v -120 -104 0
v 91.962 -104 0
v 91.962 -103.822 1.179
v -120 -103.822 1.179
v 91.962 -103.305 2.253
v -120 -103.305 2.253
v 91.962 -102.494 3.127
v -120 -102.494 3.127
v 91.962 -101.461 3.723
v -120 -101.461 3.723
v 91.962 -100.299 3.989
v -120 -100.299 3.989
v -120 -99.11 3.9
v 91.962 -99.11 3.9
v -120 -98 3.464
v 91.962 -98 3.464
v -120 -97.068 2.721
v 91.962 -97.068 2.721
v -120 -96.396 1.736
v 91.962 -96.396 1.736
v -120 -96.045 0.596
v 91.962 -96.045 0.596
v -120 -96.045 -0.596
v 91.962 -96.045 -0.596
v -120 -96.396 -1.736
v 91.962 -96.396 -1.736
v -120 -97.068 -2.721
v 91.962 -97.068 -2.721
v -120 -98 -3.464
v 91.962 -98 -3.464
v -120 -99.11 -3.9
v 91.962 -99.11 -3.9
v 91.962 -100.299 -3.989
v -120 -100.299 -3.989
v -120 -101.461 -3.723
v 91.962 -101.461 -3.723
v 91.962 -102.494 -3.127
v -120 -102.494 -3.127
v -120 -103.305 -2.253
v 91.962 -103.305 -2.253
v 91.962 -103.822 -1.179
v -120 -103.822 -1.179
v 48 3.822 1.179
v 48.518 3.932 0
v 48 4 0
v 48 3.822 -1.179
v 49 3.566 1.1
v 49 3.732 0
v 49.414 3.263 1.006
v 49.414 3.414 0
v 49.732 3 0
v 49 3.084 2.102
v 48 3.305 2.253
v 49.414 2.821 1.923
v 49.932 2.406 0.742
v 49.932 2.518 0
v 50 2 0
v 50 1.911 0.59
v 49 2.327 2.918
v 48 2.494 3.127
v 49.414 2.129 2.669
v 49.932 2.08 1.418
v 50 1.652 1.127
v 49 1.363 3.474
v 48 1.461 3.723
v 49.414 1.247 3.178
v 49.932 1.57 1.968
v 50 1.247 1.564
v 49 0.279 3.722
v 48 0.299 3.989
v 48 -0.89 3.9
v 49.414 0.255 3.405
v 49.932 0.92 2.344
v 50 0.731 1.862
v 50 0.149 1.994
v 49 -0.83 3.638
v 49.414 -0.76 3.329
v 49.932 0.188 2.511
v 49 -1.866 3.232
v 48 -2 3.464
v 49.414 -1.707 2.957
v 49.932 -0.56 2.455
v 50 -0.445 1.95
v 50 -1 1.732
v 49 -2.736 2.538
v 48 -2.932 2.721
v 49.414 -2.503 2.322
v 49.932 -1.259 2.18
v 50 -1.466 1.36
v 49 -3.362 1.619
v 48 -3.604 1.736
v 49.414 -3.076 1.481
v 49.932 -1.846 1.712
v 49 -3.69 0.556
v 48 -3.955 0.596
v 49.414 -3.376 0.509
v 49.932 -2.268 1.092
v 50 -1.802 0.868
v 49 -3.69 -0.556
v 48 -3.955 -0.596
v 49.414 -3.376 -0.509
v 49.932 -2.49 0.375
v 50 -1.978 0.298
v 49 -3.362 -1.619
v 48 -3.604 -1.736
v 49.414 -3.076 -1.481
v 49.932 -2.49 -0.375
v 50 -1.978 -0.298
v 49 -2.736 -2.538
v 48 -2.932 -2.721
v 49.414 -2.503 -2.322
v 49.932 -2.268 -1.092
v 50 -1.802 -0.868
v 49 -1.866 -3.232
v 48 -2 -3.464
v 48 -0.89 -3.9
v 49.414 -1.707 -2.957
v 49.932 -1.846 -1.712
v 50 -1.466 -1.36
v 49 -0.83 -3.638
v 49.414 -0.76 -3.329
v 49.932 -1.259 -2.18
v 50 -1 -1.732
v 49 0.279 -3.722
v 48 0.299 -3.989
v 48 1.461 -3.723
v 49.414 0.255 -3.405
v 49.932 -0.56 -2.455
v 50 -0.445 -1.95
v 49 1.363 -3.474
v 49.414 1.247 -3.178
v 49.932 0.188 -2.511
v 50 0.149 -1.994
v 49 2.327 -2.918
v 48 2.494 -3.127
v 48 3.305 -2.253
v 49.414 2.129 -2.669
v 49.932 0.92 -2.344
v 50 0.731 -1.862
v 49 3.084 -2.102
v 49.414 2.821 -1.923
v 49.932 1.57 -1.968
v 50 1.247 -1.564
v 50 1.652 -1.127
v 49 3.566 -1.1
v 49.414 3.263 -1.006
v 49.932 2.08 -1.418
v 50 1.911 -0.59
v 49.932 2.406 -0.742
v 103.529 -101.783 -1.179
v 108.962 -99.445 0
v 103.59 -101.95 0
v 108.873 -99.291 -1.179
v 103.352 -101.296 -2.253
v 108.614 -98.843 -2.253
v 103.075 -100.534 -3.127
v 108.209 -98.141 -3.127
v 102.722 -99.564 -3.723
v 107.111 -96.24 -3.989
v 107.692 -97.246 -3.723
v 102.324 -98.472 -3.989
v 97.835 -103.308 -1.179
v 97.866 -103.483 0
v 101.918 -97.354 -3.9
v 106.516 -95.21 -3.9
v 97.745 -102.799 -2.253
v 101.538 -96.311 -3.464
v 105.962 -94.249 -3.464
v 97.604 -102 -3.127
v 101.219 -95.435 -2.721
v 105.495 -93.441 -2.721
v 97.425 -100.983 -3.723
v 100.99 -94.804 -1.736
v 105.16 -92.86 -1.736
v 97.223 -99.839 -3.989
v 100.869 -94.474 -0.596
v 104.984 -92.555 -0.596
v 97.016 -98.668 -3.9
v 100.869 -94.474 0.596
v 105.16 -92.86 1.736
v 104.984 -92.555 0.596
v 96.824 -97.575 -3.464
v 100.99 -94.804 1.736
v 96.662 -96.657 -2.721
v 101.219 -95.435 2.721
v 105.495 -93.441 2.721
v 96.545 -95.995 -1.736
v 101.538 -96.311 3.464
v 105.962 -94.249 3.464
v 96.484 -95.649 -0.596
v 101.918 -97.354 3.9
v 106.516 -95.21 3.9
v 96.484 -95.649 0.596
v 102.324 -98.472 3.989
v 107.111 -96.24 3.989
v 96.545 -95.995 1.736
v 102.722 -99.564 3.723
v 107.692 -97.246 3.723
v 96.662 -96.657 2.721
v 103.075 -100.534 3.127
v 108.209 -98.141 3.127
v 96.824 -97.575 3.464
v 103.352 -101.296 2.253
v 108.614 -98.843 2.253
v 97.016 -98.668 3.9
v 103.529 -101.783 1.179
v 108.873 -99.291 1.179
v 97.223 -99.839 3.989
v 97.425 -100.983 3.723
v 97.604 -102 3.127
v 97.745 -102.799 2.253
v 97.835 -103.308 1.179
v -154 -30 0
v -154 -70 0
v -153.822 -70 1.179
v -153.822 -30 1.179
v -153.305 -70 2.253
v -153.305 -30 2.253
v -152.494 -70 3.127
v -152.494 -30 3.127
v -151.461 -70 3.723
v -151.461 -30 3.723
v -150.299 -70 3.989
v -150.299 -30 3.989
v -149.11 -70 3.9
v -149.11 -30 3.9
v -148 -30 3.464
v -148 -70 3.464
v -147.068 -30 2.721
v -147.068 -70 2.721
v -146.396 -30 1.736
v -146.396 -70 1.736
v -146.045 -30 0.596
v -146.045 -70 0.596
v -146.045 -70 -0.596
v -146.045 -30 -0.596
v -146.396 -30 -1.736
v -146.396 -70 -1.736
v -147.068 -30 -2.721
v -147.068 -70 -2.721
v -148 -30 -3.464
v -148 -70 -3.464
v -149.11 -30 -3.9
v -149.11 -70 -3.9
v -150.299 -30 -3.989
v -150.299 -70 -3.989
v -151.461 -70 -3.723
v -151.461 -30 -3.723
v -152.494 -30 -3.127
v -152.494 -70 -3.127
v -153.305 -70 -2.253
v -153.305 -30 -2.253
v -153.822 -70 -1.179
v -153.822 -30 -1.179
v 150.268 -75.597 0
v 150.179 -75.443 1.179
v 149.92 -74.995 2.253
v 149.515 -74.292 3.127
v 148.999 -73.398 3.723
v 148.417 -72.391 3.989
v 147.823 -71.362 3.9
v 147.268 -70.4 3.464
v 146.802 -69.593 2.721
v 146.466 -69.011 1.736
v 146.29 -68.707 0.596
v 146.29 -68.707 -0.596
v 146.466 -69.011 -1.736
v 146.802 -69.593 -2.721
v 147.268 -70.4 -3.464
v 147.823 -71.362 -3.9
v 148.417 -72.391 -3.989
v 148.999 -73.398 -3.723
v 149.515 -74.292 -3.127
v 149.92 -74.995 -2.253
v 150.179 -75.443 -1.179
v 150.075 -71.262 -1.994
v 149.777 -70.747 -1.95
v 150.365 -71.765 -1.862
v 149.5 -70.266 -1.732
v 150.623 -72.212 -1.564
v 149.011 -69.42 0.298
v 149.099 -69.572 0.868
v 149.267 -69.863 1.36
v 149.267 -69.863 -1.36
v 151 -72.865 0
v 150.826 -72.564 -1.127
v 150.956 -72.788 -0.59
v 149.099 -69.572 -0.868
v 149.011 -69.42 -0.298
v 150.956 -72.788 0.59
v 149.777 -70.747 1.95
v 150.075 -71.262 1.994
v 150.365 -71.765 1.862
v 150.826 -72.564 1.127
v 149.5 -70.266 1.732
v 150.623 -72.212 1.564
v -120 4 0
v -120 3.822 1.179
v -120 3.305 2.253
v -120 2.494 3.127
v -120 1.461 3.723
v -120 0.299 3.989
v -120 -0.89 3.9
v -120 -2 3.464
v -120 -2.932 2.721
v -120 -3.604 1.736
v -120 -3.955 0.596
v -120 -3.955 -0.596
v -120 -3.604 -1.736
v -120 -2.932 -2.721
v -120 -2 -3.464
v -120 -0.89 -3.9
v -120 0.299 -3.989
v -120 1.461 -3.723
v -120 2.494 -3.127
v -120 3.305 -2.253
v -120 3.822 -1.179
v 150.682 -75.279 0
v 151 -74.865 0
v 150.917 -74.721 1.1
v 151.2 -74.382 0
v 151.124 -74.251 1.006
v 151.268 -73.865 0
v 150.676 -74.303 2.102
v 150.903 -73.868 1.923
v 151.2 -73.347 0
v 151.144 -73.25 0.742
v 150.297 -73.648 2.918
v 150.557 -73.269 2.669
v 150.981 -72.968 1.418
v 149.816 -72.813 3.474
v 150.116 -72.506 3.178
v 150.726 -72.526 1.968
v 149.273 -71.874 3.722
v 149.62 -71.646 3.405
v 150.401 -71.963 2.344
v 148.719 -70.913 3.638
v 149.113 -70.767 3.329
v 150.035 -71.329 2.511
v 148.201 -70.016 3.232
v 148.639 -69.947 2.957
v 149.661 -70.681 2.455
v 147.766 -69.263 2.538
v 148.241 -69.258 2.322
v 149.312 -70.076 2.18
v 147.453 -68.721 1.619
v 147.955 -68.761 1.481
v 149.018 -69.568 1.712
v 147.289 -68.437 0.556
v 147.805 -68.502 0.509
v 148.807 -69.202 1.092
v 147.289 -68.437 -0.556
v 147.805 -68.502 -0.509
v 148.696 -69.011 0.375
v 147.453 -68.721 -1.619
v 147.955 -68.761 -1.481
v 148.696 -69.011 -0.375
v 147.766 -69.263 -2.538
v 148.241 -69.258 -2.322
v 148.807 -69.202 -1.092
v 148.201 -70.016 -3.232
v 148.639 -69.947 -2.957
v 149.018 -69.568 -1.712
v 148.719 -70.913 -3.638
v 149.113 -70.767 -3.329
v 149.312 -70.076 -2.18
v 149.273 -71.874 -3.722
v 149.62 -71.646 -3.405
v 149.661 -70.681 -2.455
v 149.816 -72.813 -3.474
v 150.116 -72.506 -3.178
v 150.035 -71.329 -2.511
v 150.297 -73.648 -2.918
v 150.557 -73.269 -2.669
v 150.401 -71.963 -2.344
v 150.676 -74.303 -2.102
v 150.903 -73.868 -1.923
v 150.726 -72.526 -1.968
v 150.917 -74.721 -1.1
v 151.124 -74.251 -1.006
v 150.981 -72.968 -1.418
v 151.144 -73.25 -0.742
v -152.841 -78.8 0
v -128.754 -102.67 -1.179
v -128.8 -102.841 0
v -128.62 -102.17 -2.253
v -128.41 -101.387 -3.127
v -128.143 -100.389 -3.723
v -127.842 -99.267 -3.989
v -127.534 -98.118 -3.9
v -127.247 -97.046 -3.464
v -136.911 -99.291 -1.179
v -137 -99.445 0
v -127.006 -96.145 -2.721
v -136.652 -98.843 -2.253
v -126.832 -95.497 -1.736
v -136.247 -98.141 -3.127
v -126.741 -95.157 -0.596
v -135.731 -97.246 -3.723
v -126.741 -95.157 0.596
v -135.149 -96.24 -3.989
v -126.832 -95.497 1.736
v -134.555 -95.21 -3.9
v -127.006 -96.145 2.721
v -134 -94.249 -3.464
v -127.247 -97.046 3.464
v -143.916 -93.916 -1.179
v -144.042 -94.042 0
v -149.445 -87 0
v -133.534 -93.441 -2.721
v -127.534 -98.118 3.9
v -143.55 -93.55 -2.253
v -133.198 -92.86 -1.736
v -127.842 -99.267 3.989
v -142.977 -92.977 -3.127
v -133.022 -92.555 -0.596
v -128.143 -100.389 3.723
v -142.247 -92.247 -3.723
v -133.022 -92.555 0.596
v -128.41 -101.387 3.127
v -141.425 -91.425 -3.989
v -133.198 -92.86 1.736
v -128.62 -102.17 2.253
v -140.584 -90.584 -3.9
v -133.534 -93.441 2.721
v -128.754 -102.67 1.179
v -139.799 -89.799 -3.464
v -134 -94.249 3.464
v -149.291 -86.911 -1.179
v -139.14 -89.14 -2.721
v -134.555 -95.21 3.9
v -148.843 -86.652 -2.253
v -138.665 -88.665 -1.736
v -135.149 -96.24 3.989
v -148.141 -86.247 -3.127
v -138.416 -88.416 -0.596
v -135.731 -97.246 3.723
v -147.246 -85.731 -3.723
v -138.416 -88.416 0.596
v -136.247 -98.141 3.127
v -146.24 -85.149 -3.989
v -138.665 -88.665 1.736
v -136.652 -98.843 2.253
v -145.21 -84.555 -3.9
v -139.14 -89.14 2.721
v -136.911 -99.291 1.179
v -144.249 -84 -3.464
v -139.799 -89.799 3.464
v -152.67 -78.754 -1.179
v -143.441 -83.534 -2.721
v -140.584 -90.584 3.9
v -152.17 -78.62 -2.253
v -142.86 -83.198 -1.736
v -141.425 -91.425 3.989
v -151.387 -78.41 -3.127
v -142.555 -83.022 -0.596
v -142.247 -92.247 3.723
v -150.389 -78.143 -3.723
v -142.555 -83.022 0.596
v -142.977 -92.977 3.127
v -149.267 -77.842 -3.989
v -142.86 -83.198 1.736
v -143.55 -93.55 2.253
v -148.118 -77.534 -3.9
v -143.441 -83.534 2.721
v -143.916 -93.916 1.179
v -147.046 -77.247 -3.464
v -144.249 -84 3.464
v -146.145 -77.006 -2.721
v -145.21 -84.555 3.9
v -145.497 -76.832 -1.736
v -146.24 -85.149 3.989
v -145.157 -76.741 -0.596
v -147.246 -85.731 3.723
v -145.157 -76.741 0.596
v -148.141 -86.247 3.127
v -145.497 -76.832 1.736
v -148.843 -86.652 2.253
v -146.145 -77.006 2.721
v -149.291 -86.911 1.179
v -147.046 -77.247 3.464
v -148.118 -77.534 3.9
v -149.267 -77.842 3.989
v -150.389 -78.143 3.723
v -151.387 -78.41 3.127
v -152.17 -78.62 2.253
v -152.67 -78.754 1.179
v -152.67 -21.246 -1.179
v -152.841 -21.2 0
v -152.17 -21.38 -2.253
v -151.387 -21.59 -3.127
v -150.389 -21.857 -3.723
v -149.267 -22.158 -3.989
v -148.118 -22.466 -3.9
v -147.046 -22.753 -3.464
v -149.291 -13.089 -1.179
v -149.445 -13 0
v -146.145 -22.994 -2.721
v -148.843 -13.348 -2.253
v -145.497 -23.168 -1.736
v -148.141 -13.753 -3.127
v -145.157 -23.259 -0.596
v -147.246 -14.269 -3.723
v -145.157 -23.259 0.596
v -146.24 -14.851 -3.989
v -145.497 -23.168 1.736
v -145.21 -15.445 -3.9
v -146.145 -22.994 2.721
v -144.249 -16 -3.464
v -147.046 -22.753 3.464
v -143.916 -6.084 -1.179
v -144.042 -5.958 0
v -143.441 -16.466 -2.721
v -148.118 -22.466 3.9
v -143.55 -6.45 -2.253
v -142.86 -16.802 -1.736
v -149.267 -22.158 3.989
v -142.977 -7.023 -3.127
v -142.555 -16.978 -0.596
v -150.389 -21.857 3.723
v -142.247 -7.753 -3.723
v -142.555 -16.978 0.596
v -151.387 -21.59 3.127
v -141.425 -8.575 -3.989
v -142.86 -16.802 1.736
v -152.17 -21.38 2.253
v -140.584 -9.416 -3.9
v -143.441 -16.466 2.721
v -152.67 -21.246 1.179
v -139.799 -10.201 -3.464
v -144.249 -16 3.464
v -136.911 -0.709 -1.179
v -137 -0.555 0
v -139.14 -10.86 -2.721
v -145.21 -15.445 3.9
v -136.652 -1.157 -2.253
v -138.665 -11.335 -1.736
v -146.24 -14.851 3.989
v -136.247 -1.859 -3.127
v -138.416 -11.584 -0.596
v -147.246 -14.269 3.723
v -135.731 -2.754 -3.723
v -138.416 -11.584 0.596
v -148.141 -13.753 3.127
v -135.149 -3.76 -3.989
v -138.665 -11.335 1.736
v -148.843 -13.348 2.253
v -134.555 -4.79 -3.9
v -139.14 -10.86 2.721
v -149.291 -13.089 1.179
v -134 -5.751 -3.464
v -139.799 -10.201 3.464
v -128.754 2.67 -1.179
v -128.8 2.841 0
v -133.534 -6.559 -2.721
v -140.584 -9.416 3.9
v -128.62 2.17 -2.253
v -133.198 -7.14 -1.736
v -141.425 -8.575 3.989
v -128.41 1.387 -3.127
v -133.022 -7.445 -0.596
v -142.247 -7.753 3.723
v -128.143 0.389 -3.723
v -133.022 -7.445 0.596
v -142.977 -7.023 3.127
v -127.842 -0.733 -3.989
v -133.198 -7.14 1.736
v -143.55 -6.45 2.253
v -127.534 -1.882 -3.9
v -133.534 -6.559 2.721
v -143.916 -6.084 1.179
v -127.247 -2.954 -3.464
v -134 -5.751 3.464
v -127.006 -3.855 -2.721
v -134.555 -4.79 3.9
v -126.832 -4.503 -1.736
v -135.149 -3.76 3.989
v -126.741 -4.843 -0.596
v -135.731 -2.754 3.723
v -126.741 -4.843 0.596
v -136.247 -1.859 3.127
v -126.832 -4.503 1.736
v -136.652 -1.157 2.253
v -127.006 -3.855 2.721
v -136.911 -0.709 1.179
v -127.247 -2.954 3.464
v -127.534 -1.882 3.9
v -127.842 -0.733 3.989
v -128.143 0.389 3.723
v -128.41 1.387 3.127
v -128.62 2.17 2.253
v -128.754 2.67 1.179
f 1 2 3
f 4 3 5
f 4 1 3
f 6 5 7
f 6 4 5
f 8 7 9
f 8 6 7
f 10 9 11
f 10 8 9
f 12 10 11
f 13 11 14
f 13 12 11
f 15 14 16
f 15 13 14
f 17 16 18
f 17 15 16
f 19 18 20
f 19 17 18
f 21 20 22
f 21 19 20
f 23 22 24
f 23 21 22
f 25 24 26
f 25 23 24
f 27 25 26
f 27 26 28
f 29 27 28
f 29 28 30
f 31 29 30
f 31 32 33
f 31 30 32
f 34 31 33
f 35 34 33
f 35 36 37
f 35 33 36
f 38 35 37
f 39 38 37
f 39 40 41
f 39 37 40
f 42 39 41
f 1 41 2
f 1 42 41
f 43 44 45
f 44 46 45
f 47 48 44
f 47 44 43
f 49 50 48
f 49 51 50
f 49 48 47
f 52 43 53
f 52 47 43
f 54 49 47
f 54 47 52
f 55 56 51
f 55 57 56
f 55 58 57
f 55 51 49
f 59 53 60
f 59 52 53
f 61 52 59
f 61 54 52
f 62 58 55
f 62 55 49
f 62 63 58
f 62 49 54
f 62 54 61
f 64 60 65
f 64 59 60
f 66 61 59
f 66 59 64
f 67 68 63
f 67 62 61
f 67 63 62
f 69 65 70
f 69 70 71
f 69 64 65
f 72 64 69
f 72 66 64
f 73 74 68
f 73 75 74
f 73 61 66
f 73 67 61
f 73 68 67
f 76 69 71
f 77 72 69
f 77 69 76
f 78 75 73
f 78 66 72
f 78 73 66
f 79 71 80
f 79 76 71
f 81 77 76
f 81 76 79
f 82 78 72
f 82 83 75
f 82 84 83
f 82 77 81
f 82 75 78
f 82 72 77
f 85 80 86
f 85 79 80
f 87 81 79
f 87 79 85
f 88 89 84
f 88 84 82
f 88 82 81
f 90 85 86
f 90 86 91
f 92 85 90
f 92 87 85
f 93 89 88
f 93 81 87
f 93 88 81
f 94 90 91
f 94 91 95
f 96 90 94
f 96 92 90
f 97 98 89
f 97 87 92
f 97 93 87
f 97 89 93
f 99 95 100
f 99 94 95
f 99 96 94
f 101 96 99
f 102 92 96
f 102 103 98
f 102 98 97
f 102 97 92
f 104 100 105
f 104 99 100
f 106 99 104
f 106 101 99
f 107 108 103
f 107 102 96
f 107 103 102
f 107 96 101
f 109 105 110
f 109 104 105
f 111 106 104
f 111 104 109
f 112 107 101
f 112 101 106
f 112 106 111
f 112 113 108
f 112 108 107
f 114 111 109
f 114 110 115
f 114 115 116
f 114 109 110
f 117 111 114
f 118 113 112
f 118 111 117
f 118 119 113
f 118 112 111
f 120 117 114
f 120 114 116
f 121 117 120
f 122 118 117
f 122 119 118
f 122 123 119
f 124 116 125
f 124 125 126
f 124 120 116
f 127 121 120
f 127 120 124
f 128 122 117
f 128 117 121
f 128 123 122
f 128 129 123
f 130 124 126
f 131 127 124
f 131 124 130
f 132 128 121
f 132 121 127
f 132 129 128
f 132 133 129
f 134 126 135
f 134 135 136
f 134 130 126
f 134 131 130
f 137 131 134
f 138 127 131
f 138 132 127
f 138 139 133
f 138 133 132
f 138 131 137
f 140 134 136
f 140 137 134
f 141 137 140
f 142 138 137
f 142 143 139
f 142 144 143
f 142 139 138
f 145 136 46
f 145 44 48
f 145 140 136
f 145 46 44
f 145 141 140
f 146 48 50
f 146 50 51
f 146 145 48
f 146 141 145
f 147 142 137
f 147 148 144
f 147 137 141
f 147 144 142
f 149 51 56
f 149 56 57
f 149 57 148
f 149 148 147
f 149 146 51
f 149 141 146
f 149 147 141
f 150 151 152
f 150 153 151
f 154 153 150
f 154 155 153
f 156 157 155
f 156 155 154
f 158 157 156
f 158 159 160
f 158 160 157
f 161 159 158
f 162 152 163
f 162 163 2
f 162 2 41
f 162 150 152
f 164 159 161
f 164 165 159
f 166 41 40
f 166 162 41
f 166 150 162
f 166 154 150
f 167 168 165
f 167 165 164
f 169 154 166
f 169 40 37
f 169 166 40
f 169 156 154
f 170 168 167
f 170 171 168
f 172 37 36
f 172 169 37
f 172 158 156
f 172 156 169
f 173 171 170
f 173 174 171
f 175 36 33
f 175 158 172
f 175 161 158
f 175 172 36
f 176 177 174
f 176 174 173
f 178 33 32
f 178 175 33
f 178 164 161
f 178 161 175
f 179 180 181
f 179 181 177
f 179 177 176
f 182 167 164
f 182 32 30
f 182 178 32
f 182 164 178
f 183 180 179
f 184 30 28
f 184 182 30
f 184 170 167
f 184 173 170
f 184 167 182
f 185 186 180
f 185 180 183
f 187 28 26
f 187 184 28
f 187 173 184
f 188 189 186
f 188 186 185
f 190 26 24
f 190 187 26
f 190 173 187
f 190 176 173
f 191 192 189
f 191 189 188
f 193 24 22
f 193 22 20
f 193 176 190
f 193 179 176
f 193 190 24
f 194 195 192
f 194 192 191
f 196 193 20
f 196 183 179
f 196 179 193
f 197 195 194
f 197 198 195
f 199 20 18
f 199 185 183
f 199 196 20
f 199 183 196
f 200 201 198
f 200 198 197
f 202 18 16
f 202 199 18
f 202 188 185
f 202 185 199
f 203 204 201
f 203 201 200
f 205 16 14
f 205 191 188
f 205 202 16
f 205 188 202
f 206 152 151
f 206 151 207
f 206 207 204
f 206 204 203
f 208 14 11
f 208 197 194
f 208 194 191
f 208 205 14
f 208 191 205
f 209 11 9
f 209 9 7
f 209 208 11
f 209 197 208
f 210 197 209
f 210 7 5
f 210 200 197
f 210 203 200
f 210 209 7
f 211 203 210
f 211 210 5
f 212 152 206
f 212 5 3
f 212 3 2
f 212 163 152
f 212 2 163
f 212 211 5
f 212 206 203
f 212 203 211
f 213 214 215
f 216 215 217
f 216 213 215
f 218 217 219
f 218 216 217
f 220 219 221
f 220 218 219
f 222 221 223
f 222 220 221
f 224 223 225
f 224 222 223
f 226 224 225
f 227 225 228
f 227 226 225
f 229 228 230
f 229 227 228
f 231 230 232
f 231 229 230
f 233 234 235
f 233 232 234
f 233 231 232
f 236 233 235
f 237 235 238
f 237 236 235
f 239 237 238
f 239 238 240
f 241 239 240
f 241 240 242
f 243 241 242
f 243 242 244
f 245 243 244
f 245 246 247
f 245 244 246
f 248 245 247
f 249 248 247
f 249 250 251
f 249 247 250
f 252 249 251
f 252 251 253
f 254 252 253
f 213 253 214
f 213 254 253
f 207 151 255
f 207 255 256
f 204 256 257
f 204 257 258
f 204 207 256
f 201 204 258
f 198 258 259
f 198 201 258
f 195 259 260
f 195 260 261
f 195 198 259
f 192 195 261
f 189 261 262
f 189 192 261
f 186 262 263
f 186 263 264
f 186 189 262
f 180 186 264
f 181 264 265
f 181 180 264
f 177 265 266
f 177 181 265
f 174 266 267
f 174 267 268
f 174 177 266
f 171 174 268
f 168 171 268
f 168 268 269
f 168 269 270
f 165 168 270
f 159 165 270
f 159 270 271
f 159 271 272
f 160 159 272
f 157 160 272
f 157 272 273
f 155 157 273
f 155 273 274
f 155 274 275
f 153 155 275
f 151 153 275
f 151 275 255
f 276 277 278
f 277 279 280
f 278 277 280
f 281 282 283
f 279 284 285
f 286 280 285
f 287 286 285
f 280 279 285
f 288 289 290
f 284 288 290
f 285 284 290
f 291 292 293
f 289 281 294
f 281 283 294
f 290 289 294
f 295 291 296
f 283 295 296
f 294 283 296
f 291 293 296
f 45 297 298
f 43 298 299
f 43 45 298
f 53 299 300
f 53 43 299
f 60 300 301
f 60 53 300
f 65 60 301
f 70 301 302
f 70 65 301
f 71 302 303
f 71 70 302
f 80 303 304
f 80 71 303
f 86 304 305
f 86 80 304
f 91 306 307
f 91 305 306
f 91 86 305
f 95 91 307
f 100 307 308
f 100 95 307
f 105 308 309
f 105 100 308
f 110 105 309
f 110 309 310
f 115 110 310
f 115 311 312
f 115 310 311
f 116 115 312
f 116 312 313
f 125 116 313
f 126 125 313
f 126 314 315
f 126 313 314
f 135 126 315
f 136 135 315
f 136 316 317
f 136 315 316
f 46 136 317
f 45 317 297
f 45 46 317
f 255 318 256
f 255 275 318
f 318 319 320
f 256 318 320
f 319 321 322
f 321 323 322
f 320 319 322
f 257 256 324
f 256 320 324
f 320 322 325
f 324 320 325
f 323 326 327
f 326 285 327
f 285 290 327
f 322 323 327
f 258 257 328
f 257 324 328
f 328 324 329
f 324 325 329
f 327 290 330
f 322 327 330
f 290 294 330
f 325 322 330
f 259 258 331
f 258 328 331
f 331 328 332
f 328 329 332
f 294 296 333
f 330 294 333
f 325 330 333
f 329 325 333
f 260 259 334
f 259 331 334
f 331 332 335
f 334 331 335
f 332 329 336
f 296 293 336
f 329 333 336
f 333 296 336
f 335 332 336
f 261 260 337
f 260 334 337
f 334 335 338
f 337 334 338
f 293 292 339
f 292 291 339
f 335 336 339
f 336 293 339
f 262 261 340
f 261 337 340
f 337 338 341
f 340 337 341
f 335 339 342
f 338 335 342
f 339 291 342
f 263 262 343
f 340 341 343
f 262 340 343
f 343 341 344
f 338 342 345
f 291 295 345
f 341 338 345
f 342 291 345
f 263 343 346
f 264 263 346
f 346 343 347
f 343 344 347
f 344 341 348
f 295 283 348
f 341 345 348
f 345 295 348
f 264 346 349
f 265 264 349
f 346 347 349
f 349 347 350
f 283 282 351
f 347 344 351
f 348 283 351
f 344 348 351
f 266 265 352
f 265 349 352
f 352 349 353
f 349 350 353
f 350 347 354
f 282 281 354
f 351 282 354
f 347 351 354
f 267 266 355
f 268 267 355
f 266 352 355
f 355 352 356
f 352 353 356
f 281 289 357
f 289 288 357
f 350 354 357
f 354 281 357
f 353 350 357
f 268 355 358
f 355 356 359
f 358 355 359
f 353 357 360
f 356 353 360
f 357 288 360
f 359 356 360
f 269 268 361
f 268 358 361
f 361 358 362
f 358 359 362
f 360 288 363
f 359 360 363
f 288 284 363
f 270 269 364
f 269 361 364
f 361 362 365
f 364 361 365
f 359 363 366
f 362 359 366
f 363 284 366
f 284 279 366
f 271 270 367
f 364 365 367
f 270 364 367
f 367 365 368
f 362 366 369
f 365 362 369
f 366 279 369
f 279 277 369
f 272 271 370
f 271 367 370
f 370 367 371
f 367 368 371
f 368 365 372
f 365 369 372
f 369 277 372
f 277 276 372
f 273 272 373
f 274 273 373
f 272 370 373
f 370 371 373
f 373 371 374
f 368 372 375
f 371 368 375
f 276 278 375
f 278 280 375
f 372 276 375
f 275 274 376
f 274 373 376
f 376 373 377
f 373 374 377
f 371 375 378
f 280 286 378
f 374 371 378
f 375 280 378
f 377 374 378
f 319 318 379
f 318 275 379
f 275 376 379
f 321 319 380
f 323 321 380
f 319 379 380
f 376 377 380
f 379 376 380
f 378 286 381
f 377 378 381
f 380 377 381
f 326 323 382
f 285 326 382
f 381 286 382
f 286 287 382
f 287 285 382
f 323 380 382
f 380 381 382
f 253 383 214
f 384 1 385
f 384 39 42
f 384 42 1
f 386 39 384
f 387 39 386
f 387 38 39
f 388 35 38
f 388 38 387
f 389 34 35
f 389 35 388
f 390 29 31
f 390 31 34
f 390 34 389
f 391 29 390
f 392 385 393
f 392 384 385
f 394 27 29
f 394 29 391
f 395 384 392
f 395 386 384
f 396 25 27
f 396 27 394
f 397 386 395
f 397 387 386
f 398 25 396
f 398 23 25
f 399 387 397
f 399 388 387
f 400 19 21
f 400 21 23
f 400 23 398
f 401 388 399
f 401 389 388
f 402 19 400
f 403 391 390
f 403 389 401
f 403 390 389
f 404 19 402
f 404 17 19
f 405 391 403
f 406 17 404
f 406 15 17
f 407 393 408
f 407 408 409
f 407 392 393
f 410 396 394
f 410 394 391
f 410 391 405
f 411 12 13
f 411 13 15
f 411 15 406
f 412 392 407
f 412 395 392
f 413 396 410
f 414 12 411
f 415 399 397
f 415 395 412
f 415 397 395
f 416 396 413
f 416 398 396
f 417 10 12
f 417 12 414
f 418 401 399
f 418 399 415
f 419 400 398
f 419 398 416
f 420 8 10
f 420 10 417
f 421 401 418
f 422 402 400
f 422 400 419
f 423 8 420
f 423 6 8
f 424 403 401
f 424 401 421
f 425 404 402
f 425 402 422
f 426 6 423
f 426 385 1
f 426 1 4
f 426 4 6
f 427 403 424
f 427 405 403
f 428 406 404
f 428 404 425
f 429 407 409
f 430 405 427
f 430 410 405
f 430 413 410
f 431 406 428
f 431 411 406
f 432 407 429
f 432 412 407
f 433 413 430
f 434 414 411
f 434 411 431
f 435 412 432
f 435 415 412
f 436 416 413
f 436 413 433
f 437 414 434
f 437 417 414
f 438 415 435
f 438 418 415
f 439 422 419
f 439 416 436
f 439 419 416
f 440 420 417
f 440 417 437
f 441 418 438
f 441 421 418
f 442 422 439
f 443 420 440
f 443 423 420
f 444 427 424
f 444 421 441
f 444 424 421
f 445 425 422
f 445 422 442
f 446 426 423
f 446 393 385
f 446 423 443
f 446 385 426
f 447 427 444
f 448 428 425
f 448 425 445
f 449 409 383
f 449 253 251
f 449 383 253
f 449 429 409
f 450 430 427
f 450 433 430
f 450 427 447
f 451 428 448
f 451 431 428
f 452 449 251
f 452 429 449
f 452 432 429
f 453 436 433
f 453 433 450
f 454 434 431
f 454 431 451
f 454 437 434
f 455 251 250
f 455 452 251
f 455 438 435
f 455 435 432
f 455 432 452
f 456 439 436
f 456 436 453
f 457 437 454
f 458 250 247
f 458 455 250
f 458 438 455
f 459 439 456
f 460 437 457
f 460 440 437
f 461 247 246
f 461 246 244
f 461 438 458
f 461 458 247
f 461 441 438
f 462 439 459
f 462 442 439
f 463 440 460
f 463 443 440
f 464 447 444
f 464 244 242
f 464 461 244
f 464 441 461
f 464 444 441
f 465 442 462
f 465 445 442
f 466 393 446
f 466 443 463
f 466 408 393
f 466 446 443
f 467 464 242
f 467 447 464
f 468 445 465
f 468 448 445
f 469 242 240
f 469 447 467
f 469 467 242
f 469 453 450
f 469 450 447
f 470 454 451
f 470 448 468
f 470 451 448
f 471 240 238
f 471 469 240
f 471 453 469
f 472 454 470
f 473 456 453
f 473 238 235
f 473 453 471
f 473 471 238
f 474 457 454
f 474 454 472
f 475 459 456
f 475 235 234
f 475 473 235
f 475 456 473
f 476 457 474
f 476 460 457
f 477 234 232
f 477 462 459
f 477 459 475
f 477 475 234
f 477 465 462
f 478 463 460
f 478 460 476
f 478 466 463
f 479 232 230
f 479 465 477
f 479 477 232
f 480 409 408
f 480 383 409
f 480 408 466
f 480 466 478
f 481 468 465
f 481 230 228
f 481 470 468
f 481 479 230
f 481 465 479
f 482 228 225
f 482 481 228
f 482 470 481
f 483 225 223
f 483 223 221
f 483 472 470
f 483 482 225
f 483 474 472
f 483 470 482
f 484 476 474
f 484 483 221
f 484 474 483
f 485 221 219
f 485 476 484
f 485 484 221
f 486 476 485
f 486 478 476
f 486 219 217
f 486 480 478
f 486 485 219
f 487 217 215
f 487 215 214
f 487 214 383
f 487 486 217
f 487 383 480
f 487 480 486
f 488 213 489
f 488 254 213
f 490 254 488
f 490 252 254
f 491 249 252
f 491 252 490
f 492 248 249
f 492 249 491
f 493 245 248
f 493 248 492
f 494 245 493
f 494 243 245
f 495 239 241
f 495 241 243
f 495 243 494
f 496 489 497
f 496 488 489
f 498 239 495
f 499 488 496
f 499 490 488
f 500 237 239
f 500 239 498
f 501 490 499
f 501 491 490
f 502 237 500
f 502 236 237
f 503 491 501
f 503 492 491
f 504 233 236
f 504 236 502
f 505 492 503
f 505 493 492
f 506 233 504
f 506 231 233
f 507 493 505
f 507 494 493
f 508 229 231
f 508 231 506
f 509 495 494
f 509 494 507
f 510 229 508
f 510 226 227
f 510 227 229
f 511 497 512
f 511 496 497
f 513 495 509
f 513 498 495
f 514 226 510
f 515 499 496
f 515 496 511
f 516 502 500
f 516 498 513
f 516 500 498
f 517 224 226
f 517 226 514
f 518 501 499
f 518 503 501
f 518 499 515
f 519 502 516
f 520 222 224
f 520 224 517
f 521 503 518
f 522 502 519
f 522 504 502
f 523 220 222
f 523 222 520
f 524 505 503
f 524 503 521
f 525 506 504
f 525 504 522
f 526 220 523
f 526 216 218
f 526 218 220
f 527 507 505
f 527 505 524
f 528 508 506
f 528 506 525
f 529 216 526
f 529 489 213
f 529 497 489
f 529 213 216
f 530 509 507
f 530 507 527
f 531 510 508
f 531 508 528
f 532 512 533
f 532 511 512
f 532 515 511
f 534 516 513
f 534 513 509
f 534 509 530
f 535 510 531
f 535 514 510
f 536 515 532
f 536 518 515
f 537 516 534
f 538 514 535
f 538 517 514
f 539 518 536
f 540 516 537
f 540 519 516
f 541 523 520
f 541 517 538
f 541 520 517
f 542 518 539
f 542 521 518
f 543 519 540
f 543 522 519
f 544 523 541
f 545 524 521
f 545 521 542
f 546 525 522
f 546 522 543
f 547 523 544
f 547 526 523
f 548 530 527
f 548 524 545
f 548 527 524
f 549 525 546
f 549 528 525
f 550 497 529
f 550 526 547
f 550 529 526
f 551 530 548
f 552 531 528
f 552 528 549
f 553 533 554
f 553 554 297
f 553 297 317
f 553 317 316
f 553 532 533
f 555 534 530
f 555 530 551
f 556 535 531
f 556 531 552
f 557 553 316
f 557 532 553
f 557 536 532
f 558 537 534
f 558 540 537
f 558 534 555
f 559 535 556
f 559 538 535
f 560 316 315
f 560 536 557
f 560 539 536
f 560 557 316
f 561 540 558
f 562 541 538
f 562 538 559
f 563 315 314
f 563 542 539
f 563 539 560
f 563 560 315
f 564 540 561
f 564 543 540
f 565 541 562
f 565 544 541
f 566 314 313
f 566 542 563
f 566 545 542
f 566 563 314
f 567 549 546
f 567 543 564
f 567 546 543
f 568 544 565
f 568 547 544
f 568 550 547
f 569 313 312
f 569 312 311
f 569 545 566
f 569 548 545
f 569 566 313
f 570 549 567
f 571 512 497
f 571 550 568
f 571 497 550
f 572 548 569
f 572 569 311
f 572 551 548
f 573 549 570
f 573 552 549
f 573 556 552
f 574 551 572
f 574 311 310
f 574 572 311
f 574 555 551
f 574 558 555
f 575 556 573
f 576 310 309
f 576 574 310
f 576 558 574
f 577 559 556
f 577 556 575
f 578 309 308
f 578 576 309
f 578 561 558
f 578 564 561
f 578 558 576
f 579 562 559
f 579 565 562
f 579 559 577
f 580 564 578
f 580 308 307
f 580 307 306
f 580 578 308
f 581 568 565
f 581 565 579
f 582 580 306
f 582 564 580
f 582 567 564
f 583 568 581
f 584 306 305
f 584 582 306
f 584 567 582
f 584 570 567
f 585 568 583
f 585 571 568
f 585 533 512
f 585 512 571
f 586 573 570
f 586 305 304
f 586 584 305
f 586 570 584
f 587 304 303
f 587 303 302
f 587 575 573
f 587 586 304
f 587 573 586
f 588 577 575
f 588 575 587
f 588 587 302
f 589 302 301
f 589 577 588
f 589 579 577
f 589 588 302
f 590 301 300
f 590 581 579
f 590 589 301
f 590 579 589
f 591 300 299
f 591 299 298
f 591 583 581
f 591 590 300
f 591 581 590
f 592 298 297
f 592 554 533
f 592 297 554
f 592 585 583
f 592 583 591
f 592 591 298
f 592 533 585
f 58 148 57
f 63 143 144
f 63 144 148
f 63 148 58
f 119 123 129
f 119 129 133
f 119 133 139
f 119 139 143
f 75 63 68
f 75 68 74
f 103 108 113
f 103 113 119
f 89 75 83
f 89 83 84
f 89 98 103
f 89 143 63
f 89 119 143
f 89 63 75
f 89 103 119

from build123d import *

# Parameters (mm, degrees)
SWEEP1_PROFILE_R = 4
FILLET1_R        = 2


with BuildPart() as part:
    # Sweep1: sweep along a path in Sketch1
    with BuildLine(Plane.XY) as sweep1_path:
        Line((150, -71.132486541), (106.961524227, -95.980762114))
        ThreePointArc((106.961524227, -95.980762114), (99.72609558, -98.977774789), (91.961524227, -100))
        Line((91.961524227, -100), (-120, -100))
        ThreePointArc((-120, -100), (-141.213203436, -91.213203436), (-150, -70))
        Line((-150, -70), (-150, -30))
        ThreePointArc((-150, -30), (-141.213203436, -8.786796564), (-120, 0))
        Line((-120, 0), (0, 0))
        Line((0, 0), (50, 0))
    # Sweep1 profile (on start of the path) → Sweep1 (sweep)
    with BuildSketch(Plane(origin=(150, -71.132486541, 0), x_dir=(0.5, -0.866025404, 0), z_dir=(-0.866025404, -0.5, 0))):
        Circle(SWEEP1_PROFILE_R)
    sweep(path=sweep1_path.line)

    # Fillet1
    fillet1_edges = [part.edges().sort_by_distance(p)[0] for p in [
        (148, -67.668384925, 0),
        (50, -4, 0),
    ]]
    fillet(fillet1_edges, radius=FILLET1_R)


solid = part.part
